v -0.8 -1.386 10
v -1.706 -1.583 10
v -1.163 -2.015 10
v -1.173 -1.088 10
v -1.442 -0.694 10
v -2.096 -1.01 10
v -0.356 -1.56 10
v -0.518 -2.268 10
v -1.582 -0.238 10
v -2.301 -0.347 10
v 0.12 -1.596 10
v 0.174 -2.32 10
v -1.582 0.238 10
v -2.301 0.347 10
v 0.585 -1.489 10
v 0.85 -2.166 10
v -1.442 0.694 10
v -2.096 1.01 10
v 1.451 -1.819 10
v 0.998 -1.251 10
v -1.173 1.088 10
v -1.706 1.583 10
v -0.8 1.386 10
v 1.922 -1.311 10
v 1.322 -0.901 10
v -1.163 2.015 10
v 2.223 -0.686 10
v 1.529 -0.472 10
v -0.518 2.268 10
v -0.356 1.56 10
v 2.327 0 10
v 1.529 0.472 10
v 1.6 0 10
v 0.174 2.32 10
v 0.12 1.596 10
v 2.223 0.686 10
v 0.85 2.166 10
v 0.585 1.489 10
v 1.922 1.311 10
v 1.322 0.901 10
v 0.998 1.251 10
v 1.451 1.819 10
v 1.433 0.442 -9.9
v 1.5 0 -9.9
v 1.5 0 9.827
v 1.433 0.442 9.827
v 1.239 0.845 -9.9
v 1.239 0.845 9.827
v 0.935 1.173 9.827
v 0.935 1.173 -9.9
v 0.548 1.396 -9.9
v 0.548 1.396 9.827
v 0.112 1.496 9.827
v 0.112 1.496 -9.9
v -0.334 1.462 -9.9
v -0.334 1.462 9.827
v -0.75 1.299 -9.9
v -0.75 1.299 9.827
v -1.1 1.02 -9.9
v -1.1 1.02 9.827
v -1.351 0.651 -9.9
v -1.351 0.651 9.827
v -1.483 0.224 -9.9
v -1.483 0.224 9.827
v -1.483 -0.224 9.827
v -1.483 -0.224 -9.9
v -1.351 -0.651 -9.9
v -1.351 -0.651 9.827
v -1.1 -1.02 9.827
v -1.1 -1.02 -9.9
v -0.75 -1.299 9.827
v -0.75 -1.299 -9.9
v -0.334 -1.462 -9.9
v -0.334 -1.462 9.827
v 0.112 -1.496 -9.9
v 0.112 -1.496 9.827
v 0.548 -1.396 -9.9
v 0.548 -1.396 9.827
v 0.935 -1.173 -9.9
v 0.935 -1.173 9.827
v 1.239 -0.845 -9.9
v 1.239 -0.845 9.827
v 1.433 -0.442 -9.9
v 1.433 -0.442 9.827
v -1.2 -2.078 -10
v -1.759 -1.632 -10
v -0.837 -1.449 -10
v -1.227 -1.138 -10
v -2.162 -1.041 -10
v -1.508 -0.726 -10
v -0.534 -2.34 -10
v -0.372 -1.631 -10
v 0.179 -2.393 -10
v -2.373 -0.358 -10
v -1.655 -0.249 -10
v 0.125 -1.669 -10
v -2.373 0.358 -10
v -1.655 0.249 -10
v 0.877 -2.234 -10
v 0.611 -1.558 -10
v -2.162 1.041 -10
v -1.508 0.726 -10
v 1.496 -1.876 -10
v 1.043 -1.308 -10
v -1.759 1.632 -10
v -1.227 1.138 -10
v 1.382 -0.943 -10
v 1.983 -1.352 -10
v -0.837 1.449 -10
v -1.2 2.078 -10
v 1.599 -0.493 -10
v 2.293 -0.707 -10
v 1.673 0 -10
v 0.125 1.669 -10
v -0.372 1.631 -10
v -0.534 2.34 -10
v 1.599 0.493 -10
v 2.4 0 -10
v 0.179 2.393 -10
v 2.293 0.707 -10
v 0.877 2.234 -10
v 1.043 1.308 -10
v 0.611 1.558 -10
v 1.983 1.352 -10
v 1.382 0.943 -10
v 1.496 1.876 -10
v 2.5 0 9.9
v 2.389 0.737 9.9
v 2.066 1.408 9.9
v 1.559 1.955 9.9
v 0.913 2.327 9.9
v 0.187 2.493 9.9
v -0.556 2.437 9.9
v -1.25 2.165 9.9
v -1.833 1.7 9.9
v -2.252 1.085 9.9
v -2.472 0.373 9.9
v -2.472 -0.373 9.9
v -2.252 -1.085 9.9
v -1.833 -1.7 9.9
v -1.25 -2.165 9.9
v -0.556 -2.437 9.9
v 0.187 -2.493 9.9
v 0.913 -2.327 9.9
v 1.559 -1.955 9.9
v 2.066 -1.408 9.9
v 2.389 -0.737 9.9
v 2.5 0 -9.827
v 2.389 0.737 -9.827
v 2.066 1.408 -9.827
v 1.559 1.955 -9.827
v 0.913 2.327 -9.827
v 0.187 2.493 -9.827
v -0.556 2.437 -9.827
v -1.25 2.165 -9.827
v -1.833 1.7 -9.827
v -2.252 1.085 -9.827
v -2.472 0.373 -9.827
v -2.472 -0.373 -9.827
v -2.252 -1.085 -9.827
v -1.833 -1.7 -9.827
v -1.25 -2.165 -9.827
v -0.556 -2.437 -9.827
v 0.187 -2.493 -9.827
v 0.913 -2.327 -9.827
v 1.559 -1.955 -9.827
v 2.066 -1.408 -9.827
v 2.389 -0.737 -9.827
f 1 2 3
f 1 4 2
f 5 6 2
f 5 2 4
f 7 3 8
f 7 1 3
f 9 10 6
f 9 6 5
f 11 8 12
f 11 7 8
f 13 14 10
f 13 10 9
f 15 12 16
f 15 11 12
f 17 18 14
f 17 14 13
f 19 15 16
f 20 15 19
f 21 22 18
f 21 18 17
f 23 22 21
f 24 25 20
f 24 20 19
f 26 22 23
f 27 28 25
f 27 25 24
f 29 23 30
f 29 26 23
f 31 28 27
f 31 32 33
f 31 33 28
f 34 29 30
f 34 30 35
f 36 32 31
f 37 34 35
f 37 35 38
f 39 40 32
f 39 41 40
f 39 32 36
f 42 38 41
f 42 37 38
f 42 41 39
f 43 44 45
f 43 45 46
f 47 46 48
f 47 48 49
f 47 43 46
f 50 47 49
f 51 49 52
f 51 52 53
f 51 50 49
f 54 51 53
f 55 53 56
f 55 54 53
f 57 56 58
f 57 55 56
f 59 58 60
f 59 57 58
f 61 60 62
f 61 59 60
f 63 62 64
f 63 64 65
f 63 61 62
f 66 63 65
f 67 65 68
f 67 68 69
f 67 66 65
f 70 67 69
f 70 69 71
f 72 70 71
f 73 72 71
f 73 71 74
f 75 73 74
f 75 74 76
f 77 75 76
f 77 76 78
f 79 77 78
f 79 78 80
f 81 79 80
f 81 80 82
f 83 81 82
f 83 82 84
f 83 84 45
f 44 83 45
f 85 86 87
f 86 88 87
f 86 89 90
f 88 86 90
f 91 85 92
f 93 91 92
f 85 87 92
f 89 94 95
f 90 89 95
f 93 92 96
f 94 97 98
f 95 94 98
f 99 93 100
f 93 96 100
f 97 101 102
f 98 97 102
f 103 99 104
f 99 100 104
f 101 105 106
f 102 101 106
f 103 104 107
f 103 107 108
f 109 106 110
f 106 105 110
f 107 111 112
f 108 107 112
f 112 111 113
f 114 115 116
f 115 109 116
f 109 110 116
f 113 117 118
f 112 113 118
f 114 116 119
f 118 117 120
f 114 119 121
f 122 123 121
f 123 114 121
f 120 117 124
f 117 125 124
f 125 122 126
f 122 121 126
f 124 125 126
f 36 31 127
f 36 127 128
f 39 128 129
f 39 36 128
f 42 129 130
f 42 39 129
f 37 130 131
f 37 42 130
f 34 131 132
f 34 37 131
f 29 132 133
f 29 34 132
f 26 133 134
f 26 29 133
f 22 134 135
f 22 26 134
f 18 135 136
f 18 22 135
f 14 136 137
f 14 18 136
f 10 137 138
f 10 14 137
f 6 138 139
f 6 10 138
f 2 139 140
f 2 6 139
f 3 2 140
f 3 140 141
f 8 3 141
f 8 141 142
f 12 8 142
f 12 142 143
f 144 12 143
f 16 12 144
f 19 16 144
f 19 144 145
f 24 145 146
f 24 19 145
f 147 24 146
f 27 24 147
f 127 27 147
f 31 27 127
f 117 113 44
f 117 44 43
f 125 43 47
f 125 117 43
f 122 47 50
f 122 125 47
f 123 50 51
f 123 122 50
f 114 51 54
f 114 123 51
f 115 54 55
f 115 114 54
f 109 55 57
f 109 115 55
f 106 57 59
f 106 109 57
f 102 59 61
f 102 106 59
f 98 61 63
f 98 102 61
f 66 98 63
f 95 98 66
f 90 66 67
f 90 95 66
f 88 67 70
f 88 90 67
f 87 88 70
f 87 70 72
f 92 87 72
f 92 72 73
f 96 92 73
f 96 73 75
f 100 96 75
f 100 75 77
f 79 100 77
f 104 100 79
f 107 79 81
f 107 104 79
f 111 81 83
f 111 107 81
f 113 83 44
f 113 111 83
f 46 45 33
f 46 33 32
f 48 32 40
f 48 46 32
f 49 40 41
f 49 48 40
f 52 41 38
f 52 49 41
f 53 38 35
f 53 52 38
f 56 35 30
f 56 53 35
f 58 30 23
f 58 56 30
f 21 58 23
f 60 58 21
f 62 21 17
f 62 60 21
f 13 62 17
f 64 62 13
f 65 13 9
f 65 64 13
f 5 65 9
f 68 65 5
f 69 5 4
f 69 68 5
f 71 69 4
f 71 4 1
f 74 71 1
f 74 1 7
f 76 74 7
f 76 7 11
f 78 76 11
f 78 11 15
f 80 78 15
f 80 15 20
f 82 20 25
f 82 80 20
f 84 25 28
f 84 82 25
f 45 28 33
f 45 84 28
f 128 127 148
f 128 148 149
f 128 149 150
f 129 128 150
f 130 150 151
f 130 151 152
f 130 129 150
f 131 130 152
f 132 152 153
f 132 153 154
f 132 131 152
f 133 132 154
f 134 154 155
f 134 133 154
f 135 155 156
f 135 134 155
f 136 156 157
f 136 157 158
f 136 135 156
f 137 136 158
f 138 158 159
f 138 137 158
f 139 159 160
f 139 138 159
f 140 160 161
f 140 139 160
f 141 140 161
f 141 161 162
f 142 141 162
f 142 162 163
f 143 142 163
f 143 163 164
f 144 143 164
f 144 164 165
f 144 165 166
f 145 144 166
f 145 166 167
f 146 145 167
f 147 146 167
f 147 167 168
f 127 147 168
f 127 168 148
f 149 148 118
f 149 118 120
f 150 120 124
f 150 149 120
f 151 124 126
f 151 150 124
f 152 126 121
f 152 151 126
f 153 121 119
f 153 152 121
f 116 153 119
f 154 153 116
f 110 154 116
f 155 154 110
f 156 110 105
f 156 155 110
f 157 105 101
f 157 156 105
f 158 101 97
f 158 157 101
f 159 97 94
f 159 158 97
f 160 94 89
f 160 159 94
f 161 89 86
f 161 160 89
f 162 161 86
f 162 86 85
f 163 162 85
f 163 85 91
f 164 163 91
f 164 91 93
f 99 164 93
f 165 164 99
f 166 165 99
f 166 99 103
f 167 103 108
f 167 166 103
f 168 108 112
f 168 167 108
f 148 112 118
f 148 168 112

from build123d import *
from OCP.BRepFilletAPI import BRepFilletAPI_MakeChamfer

# Parameters (mm, degrees)
SKETCH1_R           = 2.5
SKETCH1_R_2         = 1.5
BOSS_EXTRUDE1_DEPTH = 10
CHAMFER1_SIZE       = 0.1
CHAMFER1_SIZE2      = 0.173205081


with BuildPart() as part:
    # Sketch1 → Boss-Extrude1 (new, symmetric)
    with BuildSketch(Plane.XY):
        Circle(SKETCH1_R)
        Circle(SKETCH1_R_2, mode=Mode.SUBTRACT)
    extrude(amount=BOSS_EXTRUDE1_DEPTH, both=True)

    # Chamfer1: one chamfer whose edges measure the first distance from different faces: ONE call of the kernel's chamfer builder (chamfer() names one face for all edges)
    chamfer1_edges_1 = [part.edges().sort_by_distance(p)[0] for p in [
        (-2.5, 0, -10),
    ]]
    chamfer1_side_1 = [part.faces().sort_by_distance(p)[0] for p in [
        (-2.429289322, 0, -10),
    ]]
    chamfer1_edges_2 = [part.edges().sort_by_distance(p)[0] for p in [
        (-2.5, 0, 10),
    ]]
    chamfer1_side_2 = [part.faces().sort_by_distance(p)[0] for p in [
        (-2.5, 0, 0),
    ]]
    chamfer1_edges_3 = [part.edges().sort_by_distance(p)[0] for p in [
        (-1.5, 0, -10),
    ]]
    chamfer1_side_3 = [part.faces().sort_by_distance(p)[0] for p in [
        (-1.5, 0, 0),
    ]]
    chamfer1_edges_4 = [part.edges().sort_by_distance(p)[0] for p in [
        (-1.5, 0, 10),
    ]]
    chamfer1_side_4 = [part.faces().sort_by_distance(p)[0] for p in [
        (-2.429289322, 0, 10),
    ]]
    chamfer1 = BRepFilletAPI_MakeChamfer(part.part.solid().wrapped)
    for e in chamfer1_edges_1:
        chamfer1.Add(CHAMFER1_SIZE, CHAMFER1_SIZE2, e.wrapped, chamfer1_side_1[0].wrapped)  # the first distance lies on this face
    for e in chamfer1_edges_2:
        chamfer1.Add(CHAMFER1_SIZE, CHAMFER1_SIZE2, e.wrapped, chamfer1_side_2[0].wrapped)  # the first distance lies on this face
    for e in chamfer1_edges_3:
        chamfer1.Add(CHAMFER1_SIZE, CHAMFER1_SIZE2, e.wrapped, chamfer1_side_3[0].wrapped)  # the first distance lies on this face
    for e in chamfer1_edges_4:
        chamfer1.Add(CHAMFER1_SIZE, CHAMFER1_SIZE2, e.wrapped, chamfer1_side_4[0].wrapped)  # the first distance lies on this face
    add(Compound.cast(chamfer1.Shape()), mode=Mode.REPLACE)


solid = part.part
